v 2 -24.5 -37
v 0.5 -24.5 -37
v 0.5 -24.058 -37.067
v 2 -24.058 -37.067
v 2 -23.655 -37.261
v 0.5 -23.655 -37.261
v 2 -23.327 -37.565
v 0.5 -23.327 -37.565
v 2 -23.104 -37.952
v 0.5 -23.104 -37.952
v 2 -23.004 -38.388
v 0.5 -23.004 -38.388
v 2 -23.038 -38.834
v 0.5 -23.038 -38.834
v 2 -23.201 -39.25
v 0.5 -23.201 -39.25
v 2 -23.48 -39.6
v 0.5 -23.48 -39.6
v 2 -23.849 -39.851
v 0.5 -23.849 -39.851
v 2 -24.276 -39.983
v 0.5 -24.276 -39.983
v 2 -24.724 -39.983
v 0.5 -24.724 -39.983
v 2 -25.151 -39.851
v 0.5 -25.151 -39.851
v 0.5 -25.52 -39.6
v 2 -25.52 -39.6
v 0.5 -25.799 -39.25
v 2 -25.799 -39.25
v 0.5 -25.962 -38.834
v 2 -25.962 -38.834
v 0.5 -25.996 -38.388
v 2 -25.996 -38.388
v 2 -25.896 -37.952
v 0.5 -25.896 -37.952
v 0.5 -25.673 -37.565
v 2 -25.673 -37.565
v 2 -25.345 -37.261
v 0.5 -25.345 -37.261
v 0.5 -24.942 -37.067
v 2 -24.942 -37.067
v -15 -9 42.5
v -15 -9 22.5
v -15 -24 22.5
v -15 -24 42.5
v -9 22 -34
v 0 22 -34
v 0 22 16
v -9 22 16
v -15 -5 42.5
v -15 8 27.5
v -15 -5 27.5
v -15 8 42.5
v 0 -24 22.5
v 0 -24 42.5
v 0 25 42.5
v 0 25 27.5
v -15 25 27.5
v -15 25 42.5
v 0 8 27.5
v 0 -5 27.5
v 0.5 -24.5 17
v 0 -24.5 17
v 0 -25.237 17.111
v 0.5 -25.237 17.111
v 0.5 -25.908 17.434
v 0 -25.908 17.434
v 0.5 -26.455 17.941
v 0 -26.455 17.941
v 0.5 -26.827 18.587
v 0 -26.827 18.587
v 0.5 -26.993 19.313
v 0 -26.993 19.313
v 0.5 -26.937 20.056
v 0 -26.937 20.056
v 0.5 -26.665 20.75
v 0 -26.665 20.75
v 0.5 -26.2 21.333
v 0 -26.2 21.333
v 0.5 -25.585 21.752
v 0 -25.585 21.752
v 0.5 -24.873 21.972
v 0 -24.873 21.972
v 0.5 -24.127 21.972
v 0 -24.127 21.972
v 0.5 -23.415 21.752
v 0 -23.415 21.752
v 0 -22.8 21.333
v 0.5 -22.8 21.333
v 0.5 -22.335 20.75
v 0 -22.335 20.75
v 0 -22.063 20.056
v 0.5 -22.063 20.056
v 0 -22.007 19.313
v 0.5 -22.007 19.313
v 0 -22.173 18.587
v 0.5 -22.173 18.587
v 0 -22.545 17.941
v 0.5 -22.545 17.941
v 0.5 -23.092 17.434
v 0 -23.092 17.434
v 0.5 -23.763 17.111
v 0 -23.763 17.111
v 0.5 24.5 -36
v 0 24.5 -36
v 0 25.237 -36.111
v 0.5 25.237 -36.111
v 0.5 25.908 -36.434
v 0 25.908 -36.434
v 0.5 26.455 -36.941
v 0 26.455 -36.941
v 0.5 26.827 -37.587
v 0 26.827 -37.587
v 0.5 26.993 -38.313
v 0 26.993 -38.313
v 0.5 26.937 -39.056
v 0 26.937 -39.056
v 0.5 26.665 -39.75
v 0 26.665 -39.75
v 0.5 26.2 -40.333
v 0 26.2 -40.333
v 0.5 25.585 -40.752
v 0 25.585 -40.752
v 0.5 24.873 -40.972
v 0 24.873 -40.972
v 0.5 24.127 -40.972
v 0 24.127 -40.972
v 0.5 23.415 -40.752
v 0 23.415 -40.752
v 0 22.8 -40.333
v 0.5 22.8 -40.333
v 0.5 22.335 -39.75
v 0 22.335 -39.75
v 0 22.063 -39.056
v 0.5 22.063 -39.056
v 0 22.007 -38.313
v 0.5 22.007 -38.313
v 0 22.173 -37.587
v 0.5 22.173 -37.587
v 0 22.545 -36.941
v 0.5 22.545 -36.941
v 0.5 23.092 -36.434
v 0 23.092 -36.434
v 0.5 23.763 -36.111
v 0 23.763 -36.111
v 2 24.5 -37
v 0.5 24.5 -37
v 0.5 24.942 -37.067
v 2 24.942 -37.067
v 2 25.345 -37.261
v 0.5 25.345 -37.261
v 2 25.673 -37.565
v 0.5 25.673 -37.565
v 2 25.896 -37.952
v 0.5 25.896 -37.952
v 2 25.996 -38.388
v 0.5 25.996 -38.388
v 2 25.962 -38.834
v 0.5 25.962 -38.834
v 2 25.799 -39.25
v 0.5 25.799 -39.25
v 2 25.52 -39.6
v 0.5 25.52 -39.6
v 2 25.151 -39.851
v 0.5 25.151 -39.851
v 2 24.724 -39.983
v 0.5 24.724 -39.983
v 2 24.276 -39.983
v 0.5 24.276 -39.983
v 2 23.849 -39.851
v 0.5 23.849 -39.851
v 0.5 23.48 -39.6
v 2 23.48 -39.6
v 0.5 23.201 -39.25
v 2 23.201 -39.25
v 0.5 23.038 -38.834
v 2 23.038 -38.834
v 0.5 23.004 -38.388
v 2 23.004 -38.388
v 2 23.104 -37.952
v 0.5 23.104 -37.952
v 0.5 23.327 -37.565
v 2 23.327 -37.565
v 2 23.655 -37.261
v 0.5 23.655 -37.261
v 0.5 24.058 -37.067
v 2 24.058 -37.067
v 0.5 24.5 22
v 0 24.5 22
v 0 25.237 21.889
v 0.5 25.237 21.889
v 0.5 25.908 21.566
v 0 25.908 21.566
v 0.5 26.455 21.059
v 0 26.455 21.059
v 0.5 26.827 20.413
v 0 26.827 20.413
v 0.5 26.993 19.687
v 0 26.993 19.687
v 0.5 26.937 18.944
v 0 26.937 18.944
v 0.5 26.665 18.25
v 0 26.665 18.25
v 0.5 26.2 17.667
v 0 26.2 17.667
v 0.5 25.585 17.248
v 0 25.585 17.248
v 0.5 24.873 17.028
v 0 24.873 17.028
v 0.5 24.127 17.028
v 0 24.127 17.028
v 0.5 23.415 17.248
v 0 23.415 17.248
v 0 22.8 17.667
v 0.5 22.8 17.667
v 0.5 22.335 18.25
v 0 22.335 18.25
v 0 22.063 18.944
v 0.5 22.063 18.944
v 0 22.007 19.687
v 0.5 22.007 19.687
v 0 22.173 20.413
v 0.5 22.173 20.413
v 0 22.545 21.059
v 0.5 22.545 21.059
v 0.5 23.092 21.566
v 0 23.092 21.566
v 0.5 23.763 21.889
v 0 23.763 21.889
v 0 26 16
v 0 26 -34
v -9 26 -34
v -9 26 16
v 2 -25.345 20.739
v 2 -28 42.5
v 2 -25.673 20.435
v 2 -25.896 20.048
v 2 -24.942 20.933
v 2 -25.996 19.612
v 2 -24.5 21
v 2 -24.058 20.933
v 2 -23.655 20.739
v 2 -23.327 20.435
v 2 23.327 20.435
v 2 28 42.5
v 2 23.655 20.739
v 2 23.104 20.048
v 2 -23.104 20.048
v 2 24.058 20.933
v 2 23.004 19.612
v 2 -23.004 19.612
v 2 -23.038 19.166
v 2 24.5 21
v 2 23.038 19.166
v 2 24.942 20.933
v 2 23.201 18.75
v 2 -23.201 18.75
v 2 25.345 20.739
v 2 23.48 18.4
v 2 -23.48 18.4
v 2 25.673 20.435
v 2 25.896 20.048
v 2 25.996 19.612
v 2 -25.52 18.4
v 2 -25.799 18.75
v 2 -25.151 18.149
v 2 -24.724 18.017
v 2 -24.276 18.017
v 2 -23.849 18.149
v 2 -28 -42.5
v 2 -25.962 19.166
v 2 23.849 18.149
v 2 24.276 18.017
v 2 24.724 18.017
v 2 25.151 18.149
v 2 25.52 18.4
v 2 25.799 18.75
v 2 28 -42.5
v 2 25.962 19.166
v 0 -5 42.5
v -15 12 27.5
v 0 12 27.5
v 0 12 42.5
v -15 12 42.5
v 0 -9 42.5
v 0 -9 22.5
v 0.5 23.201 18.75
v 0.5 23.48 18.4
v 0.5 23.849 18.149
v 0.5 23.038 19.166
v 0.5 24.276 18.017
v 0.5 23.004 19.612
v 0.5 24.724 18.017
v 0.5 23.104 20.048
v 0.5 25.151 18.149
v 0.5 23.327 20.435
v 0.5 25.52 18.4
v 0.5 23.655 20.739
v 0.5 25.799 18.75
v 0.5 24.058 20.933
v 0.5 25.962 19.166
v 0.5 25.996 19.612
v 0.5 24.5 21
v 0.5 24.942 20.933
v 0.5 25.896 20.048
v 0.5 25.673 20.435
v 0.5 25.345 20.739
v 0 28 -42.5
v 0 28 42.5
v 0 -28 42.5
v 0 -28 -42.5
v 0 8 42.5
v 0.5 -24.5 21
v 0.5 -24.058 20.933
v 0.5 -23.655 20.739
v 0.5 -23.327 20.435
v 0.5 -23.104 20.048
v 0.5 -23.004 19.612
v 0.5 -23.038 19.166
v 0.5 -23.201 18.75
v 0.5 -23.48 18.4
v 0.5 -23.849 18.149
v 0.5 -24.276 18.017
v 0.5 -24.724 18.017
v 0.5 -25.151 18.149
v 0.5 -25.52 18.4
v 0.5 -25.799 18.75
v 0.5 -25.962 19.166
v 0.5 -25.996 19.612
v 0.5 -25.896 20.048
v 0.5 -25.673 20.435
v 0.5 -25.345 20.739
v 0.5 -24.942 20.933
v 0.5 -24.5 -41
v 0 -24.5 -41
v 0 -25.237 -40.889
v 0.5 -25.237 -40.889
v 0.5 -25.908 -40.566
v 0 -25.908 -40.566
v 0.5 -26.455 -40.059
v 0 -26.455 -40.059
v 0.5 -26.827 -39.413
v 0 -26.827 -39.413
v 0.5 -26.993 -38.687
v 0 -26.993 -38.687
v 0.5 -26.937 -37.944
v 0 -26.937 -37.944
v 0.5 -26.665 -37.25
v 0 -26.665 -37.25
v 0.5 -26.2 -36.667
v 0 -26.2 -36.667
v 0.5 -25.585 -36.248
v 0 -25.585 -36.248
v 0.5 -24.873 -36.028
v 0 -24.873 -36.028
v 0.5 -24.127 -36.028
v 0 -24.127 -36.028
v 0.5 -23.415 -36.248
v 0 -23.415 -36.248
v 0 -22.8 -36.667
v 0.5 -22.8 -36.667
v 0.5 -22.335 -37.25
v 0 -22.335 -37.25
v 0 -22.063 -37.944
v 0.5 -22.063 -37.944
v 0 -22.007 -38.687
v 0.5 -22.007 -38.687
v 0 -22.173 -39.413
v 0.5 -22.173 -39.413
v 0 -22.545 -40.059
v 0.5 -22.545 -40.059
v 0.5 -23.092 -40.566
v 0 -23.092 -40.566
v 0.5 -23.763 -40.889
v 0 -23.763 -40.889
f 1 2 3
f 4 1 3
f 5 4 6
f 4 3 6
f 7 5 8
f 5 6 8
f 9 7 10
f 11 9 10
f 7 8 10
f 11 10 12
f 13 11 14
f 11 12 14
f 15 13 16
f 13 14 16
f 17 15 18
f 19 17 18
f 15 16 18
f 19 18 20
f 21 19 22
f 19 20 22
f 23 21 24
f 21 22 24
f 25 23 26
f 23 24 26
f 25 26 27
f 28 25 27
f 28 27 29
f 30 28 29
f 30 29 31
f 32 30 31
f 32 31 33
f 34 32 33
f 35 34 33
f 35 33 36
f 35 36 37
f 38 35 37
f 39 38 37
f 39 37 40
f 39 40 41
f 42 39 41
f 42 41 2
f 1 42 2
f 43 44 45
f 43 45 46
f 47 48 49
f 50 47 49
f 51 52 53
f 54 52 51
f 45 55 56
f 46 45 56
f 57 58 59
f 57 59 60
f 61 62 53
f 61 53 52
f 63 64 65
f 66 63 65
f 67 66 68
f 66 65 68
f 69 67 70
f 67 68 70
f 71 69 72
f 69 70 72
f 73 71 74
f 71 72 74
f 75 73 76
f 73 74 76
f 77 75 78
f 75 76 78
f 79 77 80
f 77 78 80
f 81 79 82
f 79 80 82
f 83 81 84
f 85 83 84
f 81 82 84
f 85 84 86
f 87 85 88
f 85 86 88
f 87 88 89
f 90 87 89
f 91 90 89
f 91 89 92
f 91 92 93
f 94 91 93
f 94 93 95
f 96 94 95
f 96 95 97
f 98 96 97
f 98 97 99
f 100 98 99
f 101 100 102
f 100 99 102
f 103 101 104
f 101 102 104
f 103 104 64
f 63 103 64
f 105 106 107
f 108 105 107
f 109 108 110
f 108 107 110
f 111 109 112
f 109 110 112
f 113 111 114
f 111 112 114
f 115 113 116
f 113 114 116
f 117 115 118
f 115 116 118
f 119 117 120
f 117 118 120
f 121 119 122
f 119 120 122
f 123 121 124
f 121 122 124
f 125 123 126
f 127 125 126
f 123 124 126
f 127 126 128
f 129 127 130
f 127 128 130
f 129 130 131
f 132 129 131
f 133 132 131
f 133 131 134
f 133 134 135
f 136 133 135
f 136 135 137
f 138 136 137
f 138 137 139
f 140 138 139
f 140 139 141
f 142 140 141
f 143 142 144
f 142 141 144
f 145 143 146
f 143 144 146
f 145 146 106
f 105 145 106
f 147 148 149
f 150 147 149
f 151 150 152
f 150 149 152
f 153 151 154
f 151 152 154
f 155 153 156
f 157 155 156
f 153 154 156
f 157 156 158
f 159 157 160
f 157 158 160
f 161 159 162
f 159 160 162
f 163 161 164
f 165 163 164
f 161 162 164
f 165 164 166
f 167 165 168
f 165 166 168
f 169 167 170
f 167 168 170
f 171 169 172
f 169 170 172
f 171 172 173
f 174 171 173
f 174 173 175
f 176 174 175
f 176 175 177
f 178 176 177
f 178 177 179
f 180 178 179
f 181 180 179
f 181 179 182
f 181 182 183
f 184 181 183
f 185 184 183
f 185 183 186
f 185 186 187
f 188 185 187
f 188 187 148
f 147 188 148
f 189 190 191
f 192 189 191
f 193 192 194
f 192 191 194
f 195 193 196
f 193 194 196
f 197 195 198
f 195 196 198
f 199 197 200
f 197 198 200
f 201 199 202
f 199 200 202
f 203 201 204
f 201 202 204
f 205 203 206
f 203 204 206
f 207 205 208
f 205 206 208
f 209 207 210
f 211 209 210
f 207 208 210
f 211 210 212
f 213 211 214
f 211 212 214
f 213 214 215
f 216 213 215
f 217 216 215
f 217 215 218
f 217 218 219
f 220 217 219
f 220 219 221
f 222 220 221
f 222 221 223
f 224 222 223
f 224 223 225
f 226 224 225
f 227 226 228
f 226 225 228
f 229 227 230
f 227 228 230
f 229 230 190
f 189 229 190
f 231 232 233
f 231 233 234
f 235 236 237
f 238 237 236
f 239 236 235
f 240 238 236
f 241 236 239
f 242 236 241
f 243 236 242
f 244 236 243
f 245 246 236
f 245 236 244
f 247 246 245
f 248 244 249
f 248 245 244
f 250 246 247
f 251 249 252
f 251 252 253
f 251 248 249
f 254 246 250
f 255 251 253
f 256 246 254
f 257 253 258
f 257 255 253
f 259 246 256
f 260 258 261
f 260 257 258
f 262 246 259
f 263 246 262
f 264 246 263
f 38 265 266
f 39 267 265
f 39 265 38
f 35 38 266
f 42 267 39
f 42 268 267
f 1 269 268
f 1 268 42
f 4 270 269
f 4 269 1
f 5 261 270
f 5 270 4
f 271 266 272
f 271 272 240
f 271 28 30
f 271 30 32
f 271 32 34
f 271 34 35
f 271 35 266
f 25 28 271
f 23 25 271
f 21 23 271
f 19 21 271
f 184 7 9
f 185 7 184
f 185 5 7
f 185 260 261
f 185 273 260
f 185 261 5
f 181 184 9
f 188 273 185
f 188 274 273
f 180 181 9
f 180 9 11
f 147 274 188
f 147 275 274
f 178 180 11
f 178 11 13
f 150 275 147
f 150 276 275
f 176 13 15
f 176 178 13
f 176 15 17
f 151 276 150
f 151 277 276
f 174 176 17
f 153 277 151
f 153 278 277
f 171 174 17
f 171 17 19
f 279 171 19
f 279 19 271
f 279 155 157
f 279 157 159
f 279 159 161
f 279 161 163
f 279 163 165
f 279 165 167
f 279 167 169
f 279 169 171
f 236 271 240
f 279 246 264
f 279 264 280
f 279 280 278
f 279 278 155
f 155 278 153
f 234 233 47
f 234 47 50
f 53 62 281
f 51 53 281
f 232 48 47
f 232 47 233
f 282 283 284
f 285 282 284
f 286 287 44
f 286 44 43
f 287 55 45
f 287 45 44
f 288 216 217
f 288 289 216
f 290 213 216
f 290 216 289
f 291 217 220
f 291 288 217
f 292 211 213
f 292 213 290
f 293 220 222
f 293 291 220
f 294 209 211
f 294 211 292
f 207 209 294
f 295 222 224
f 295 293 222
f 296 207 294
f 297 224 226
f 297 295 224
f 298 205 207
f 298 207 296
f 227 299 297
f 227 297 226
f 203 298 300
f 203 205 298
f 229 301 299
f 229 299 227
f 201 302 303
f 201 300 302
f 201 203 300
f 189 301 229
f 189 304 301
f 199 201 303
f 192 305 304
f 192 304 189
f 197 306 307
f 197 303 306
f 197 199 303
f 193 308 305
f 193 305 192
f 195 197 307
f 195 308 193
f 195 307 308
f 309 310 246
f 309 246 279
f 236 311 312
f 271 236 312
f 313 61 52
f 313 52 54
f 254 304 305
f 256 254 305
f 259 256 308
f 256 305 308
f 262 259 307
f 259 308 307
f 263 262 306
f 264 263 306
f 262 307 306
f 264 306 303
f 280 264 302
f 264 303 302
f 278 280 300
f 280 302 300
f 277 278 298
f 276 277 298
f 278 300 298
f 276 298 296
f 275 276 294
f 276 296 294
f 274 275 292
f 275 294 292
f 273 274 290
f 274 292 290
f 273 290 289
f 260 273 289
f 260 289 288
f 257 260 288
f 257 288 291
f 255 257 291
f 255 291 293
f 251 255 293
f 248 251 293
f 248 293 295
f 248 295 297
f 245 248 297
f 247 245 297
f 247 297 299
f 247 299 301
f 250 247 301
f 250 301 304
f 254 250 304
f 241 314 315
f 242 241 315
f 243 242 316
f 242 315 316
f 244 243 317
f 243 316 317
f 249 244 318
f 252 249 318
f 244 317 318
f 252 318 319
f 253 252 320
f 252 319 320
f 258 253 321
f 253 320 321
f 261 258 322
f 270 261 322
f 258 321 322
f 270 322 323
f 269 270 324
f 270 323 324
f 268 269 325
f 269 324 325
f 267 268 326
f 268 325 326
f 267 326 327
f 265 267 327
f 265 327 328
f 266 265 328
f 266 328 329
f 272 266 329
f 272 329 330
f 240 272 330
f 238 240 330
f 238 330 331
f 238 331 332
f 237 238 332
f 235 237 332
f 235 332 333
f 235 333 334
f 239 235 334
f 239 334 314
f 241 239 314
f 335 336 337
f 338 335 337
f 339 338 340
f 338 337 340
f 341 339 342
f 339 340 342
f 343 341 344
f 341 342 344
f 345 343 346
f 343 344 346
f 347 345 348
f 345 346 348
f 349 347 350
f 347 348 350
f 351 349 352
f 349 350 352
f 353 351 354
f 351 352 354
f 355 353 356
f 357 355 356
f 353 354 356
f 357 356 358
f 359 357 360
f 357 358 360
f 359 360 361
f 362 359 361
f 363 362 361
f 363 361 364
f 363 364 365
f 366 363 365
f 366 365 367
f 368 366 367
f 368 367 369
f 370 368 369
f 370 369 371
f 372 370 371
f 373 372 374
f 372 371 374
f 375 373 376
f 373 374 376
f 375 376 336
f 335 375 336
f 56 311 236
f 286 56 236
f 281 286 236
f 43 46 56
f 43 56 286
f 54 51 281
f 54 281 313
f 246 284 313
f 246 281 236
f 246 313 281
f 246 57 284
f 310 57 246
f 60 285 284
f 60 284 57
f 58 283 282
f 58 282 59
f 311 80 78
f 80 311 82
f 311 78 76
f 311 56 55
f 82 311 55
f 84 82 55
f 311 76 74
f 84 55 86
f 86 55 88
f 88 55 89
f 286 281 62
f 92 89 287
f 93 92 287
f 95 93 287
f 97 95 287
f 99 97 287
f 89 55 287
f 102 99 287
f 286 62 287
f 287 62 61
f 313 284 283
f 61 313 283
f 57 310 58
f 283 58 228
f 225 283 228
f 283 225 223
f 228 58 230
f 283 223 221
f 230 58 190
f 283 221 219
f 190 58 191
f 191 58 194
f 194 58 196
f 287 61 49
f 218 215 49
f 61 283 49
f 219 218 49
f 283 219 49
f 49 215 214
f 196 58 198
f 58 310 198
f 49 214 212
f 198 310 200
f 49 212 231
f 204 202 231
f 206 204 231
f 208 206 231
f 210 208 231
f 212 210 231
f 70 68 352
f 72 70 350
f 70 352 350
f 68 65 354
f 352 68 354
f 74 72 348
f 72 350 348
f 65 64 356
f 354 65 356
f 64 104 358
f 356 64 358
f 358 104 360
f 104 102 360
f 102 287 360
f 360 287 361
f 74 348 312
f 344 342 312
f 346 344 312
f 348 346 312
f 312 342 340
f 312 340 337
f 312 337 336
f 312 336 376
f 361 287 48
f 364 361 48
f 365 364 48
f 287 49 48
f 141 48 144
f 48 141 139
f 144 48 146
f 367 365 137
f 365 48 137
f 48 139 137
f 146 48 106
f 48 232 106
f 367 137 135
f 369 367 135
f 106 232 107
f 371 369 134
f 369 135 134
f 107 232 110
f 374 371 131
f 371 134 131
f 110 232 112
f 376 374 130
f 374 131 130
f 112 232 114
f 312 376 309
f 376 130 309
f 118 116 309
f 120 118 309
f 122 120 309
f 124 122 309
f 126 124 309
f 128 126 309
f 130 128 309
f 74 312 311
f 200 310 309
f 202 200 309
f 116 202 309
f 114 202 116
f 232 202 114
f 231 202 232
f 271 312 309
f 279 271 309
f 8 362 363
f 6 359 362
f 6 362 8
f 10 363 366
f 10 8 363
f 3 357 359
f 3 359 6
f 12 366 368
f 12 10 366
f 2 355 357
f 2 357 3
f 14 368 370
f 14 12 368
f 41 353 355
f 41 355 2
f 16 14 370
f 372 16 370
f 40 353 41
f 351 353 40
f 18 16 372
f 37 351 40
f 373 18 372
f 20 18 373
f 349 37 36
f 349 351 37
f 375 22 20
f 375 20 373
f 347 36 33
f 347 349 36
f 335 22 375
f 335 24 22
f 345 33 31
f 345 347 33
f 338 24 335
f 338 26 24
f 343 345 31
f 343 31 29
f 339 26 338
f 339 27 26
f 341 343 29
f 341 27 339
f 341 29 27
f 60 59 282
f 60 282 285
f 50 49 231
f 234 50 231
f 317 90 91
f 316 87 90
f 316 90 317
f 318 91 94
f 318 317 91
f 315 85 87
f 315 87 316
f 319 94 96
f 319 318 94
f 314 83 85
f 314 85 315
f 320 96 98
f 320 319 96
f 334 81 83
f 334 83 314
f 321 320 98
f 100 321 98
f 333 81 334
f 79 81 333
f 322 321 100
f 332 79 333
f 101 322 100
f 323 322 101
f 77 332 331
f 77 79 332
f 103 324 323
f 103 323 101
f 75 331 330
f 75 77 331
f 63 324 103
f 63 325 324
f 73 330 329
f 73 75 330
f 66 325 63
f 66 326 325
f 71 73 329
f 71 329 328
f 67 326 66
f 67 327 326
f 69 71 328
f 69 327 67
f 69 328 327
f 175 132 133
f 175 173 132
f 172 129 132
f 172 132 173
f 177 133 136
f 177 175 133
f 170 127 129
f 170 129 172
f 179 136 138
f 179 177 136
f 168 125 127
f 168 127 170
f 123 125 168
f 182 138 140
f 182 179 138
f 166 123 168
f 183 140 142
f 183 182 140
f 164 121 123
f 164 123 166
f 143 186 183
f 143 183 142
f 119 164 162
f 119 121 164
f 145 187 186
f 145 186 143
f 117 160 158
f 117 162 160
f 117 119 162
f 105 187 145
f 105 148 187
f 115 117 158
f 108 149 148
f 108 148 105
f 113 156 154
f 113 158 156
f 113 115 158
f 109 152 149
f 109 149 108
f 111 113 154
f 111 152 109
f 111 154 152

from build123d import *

# Parameters (mm, degrees)
ESQUISSE1_W             = 85
ESQUISSE1_H             = 56
BOSS_EXTRU_1_DEPTH      = 2
ESQUISSE2_W             = 20
ESQUISSE2_H             = 15
ESQUISSE2_W_2           = 15
ESQUISSE2_H_2           = 13
BOSS_EXTRU_2_DEPTH      = 15
ESQUISSE3_R             = 1.5
ENL_V_MAT_EXTRU_1_DEPTH = 15
ESQUISSE5_R             = 2.5
ENL_V_MAT_EXTRU_2_DEPTH = 0.5
ESQUISSE6_W             = 50
ESQUISSE6_H             = 4
BOSS_EXTRU_3_DEPTH      = 9


with BuildPart() as part:
    # Esquisse1 → Boss.-Extru.1 (new body)
    with BuildSketch(Plane(origin=(0, 0, 0), x_dir=(0, 0, -1), z_dir=(1, 0, 0))):
        Rectangle(ESQUISSE1_W, ESQUISSE1_H)
    extrude(amount=BOSS_EXTRU_1_DEPTH)

    # Esquisse2 → Boss.-Extru.2 (add)
    with BuildSketch(Plane.ZY):
        with Locations((32.5, -16.5)):
            Rectangle(ESQUISSE2_W, ESQUISSE2_H)
        with Locations((35, 1.5)):
            Rectangle(ESQUISSE2_W_2, ESQUISSE2_H_2)
        with Locations((35, 18.5)):
            Rectangle(ESQUISSE2_W_2, ESQUISSE2_H_2)
    extrude(amount=BOSS_EXTRU_2_DEPTH)

    # Esquisse3 → Enlèv. mat.-Extru.1 (cut)
    with BuildSketch(Plane.ZY):
        with Locations((-38.5, 24.5)):
            Circle(ESQUISSE3_R)
        with Locations((19.5, 24.5)):
            Circle(ESQUISSE3_R)
        with Locations((-38.5, -24.5)):
            Circle(ESQUISSE3_R)
        with Locations((19.5, -24.5)):
            Circle(ESQUISSE3_R)
    extrude(amount=-ENL_V_MAT_EXTRU_1_DEPTH, mode=Mode.SUBTRACT)

    # Esquisse5 → Enlèv. mat.-Extru.2 (cut)
    with BuildSketch(Plane.ZY):
        with Locations((19.5, 24.5)):
            Circle(ESQUISSE5_R)
        with Locations((-38.5, 24.5)):
            Circle(ESQUISSE5_R)
        with Locations(Location((-38.5, -24.5, 0), (0, 0, 180))):
            Circle(ESQUISSE5_R)
        with Locations(Location((19.5, -24.5, 0), (0, 0, 180))):
            Circle(ESQUISSE5_R)
    extrude(amount=-ENL_V_MAT_EXTRU_2_DEPTH, mode=Mode.SUBTRACT)

    # Esquisse6 → Boss.-Extru.3 (add)
    with BuildSketch(Plane.ZY):
        with Locations((-9, 24)):
            Rectangle(ESQUISSE6_W, ESQUISSE6_H)
    extrude(amount=BOSS_EXTRU_3_DEPTH)


solid = part.part
